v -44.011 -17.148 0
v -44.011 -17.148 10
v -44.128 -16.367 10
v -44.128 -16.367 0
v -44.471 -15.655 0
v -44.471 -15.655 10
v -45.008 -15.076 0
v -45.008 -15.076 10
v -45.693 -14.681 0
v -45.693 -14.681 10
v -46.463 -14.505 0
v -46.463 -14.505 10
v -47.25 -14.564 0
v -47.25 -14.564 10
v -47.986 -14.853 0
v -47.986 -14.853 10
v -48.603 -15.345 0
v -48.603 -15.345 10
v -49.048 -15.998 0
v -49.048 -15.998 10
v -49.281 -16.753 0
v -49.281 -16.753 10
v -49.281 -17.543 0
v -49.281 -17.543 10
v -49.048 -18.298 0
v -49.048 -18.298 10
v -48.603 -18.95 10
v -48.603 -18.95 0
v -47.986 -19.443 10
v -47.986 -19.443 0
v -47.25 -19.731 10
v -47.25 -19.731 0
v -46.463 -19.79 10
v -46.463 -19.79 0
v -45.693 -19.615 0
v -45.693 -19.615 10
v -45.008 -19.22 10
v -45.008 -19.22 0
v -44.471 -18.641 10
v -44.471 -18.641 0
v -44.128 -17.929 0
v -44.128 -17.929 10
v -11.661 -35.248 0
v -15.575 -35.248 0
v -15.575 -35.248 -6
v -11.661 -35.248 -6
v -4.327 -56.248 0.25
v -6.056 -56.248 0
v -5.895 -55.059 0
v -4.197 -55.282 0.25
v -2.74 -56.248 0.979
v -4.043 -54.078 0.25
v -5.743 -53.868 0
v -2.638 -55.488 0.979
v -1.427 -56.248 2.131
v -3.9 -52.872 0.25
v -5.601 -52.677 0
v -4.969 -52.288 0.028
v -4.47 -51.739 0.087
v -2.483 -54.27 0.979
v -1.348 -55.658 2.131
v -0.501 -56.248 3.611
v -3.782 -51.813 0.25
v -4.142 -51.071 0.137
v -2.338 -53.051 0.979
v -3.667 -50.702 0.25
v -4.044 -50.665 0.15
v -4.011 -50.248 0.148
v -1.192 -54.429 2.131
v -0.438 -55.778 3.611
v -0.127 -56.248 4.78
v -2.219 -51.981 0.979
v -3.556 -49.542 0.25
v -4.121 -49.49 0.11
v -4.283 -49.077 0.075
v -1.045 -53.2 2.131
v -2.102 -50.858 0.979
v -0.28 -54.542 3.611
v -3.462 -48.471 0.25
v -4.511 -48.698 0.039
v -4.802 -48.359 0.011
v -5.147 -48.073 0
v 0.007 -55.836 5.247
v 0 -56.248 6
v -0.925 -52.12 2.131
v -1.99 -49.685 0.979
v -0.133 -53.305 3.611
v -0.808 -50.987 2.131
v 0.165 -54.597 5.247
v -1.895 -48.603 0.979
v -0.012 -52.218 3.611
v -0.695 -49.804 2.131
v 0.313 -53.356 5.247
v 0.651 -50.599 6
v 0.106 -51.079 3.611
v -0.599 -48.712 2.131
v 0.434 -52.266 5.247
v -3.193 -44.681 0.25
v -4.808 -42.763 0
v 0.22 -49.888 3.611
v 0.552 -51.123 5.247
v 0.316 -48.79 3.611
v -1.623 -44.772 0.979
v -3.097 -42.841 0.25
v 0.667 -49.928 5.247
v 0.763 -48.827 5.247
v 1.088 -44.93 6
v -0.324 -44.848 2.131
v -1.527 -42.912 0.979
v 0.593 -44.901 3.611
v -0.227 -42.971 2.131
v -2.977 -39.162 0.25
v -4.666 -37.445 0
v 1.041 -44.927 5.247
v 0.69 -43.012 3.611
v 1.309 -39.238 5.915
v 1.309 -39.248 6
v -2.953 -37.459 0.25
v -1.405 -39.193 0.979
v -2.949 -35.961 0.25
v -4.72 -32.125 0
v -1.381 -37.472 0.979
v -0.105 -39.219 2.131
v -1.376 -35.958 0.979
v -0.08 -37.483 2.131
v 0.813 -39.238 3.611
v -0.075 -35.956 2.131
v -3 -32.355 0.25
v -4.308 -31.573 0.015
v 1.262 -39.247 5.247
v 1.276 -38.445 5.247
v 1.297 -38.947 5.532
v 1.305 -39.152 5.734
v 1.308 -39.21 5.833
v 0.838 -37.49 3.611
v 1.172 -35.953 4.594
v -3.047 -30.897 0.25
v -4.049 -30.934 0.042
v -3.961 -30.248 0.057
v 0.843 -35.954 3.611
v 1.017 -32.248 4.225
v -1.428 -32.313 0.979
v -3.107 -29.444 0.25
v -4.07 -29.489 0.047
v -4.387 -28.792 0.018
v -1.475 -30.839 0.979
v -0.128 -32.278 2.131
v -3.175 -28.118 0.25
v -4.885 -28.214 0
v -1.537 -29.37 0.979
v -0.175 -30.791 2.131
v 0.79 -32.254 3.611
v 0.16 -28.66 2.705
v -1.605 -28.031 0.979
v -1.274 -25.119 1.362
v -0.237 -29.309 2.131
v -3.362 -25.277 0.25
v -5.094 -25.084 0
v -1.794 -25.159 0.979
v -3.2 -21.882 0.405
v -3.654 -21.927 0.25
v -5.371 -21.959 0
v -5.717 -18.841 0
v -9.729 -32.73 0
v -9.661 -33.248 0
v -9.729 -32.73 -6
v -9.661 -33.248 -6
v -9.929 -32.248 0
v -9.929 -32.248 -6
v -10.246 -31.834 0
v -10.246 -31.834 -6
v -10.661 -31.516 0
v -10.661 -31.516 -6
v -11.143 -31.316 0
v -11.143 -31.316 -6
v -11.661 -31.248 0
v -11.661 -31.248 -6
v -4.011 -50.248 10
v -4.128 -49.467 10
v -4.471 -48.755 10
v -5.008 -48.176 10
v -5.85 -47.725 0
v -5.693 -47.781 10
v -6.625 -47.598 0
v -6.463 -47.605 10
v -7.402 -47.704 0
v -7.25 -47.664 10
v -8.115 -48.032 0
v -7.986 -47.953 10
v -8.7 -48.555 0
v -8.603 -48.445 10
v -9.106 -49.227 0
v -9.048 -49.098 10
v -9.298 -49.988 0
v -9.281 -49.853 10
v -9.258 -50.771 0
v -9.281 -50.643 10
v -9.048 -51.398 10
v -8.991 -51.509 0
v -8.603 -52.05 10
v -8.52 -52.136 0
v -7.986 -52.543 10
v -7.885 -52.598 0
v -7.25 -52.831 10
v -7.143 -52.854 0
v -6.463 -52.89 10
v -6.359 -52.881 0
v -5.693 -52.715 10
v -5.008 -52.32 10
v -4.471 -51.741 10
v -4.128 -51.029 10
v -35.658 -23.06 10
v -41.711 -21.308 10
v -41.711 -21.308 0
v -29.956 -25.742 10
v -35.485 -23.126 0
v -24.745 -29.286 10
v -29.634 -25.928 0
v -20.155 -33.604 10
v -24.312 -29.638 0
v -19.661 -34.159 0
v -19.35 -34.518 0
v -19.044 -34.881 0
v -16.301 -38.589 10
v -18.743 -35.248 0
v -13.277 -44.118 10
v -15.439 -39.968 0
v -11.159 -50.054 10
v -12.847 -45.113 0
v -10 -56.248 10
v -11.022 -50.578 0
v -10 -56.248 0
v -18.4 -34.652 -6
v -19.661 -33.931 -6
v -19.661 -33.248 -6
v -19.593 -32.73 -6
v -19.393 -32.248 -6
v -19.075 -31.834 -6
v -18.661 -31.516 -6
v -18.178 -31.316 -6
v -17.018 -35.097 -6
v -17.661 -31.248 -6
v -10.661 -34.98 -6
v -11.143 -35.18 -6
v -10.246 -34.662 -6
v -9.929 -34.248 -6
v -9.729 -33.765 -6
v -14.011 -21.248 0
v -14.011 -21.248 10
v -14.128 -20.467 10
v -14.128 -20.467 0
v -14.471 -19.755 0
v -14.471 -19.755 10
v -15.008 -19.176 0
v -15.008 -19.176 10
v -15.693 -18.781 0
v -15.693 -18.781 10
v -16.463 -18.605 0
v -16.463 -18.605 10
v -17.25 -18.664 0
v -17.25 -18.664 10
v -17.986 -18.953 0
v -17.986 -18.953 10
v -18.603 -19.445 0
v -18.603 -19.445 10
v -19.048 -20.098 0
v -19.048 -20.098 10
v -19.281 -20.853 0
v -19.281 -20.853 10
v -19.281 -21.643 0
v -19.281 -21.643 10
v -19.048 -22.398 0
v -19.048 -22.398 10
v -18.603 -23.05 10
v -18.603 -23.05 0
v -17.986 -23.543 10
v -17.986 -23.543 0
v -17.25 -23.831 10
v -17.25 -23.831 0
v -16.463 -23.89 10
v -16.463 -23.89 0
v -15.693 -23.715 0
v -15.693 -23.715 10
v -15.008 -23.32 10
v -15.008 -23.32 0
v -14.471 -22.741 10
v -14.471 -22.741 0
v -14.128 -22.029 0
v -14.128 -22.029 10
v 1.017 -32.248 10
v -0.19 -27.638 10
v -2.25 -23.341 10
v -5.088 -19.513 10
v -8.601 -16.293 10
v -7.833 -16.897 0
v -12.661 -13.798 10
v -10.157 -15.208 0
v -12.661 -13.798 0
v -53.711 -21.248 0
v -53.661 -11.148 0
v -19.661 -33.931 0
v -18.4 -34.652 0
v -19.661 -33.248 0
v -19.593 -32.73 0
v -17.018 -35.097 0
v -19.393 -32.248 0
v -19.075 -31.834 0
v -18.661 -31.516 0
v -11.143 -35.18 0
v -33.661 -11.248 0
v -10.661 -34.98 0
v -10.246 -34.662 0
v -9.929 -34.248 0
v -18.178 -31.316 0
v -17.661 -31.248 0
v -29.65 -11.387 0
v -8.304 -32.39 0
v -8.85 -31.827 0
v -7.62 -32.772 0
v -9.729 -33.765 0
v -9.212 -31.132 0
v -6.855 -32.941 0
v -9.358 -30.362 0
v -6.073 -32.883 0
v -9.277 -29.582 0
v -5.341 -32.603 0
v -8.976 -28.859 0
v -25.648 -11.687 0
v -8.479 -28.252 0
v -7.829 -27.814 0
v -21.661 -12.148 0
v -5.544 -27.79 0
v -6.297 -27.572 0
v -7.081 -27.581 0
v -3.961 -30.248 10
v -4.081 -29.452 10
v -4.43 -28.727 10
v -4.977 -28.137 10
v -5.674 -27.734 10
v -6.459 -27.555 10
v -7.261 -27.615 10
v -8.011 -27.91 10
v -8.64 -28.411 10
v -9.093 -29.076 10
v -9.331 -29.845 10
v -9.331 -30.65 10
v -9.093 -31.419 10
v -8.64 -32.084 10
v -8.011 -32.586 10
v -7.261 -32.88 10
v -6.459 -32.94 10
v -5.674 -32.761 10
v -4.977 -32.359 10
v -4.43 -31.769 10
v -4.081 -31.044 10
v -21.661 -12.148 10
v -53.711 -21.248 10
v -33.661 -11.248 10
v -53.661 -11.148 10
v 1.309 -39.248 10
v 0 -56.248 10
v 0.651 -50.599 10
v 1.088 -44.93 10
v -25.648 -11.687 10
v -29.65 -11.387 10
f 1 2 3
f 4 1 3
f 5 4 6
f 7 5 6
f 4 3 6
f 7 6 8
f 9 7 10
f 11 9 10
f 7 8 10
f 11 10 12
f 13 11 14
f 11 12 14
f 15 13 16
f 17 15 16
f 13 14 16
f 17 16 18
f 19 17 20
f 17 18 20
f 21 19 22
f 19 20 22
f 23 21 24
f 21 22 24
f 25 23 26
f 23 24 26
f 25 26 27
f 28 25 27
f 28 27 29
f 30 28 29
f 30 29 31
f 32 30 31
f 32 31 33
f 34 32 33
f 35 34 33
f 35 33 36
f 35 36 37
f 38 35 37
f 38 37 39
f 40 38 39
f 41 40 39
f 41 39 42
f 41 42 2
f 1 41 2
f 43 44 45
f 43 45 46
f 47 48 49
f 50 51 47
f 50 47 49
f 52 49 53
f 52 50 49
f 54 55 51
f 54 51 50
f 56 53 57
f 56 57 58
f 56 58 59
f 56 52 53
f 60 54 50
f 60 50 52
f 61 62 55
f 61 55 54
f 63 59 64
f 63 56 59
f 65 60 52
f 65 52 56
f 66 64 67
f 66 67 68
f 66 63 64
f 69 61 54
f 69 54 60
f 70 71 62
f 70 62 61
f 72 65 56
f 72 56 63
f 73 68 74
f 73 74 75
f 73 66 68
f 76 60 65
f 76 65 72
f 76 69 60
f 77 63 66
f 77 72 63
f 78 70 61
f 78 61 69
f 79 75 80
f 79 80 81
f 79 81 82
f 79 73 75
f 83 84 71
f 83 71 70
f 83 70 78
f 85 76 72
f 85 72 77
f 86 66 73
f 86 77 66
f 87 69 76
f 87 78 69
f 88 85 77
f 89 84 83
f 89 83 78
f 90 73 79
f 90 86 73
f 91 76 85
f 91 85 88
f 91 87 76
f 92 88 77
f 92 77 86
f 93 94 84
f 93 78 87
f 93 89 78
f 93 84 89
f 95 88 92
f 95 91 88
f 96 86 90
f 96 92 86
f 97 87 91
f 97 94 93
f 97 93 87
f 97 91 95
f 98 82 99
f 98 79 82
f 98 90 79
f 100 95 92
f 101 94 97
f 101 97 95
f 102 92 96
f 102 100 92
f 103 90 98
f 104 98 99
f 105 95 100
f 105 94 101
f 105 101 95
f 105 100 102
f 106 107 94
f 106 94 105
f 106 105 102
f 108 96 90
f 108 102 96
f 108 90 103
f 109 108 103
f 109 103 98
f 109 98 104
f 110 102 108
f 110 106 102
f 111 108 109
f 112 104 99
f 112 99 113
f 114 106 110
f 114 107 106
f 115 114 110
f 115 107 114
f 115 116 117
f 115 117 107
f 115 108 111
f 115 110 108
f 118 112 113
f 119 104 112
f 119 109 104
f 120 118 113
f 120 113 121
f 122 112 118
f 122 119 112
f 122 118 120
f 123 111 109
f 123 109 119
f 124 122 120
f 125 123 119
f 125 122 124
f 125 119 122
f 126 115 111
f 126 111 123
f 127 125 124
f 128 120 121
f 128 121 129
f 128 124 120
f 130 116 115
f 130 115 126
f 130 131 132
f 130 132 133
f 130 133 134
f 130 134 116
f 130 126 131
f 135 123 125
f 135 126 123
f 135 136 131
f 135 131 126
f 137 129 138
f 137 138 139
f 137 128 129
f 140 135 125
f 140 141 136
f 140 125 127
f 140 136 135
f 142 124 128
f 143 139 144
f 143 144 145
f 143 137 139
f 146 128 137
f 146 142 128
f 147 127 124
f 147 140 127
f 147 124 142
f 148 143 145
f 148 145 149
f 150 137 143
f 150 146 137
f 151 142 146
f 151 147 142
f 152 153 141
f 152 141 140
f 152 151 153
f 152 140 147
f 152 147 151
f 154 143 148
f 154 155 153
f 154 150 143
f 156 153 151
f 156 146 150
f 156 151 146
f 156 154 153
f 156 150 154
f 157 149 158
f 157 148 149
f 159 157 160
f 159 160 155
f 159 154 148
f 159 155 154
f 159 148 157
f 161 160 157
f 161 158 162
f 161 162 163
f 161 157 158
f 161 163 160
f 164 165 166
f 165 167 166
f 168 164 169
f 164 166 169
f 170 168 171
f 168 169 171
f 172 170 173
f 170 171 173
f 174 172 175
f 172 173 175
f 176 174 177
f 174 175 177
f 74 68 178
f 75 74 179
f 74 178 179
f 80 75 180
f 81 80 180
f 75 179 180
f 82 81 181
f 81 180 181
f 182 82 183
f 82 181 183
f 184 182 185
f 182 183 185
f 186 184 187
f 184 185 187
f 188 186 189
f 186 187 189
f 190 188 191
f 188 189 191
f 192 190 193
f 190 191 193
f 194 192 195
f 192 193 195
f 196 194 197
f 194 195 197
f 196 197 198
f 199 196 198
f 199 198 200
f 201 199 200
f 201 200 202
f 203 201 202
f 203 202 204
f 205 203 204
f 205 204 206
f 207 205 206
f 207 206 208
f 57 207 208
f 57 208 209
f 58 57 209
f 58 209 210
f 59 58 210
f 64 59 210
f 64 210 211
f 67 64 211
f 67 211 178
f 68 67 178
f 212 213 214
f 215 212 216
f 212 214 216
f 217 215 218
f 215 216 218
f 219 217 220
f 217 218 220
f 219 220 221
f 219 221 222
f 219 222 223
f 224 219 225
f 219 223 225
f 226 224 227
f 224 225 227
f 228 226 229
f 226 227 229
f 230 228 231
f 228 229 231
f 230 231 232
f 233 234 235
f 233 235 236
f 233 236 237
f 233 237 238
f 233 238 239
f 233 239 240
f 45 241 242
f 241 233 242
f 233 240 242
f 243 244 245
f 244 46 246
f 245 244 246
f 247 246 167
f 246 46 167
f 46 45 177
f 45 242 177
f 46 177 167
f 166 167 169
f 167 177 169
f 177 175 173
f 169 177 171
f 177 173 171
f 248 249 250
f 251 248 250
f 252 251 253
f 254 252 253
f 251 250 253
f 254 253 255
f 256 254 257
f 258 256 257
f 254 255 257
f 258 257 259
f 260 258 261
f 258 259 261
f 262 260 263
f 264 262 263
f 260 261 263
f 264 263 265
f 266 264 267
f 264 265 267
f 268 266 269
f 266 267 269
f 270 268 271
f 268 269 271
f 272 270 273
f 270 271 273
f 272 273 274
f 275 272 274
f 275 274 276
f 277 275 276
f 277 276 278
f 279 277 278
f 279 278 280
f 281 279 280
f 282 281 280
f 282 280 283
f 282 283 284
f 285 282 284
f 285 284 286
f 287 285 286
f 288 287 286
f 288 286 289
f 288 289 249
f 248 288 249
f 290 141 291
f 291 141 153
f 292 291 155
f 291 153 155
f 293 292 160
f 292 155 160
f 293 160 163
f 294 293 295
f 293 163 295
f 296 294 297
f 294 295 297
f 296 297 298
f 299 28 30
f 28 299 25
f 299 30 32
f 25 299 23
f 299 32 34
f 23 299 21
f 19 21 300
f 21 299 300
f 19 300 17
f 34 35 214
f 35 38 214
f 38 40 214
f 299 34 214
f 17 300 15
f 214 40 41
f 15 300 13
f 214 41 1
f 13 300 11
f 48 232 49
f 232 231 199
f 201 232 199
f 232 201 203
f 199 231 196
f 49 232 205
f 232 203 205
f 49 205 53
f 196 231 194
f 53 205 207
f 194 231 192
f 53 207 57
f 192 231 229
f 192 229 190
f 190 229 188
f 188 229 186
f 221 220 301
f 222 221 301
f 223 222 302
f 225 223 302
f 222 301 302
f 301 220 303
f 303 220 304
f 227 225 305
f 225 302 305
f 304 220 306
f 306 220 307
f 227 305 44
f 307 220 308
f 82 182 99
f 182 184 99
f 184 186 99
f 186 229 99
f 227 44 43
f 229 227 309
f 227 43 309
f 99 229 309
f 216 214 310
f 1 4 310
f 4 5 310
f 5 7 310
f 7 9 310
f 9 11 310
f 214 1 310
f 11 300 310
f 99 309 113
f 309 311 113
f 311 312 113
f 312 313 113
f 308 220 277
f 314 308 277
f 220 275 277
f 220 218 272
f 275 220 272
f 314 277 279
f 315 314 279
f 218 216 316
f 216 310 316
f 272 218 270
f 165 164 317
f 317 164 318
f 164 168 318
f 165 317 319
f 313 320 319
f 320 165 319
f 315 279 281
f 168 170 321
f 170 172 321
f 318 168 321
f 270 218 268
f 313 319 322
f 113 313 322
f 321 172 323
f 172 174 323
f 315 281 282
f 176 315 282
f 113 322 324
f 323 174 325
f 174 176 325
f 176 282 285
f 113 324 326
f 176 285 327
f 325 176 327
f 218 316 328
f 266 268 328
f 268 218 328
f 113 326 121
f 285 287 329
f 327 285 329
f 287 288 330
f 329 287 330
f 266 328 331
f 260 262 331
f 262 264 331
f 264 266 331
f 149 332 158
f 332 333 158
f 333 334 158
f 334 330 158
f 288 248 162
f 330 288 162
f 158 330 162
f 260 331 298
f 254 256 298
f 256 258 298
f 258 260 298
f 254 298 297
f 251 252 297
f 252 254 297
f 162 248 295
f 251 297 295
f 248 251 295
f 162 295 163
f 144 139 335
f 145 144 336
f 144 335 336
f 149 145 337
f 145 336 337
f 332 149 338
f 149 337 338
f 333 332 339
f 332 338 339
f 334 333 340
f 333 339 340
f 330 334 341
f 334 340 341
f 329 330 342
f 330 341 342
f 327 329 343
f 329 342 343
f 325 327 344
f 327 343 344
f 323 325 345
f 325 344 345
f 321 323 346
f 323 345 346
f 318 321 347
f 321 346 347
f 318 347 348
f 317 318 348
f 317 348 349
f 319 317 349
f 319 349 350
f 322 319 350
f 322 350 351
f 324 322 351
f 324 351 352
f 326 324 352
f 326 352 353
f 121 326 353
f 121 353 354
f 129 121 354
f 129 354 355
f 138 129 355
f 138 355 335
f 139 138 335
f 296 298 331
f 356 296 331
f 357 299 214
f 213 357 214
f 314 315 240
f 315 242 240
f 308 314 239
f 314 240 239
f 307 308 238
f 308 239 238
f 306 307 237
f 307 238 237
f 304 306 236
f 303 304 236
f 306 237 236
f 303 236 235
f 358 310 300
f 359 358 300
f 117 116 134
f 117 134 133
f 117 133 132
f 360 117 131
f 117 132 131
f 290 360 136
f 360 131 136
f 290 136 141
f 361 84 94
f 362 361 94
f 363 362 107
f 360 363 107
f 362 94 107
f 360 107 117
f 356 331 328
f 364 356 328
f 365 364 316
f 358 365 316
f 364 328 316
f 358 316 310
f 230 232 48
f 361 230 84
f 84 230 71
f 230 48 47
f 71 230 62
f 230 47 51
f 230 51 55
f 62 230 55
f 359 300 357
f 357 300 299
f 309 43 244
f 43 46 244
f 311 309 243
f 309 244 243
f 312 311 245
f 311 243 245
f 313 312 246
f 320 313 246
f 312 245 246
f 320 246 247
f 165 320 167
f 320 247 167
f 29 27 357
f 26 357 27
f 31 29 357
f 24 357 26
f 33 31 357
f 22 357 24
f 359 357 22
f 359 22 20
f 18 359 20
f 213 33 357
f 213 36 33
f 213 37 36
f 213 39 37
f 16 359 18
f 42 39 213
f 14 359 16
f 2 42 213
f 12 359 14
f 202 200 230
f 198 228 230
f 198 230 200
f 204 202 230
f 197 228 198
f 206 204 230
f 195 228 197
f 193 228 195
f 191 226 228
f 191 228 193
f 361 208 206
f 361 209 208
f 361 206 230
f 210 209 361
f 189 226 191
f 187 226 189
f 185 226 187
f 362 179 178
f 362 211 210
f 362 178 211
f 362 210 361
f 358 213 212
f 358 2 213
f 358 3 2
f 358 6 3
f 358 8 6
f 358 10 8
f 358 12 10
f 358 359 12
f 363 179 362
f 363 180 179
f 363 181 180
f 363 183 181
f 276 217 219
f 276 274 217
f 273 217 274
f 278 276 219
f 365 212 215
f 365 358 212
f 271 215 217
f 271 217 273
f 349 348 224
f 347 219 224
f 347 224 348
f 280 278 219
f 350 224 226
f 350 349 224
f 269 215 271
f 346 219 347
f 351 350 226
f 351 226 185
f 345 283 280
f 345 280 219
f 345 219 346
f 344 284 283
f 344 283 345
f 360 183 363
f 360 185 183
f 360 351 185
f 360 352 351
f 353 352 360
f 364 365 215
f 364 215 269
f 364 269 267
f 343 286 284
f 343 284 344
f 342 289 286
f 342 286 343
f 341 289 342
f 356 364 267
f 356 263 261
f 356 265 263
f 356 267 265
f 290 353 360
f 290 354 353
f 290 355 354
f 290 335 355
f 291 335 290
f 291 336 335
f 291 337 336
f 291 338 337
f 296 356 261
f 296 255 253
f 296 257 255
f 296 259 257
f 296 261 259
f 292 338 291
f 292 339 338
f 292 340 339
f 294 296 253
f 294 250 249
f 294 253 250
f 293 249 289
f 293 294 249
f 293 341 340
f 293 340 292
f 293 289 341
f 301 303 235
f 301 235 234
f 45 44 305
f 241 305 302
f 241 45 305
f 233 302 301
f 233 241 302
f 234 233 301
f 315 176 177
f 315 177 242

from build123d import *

# Parameters (mm, degrees)
F1_DEPTH    = 10
F2_R        = 2.65
F2_R_2      = 2.7
F3_DEPTH    = 10.001
F4_T2_ANGLE = 34.0182957269
F6_DEPTH    = 6
F7_R        = 1.99999
F8_T1_DEPTH = 13.9199888123


# Not quite as in the source:
# - a fillet or chamfer that OpenCascade refuses, or shapes differently, is made with other operations: its cross-section is extruded or revolved along the edge and cut away or added
# - a fillet or chamfer is up to 0.001 mm smaller than in the source, because OpenCascade refuses the exact size


with BuildPart() as f1:
    # F0 (on Top) → F1 (new body)
    with BuildSketch(Plane.XY):
        with BuildLine():
            Line((-33.6606874732, -11.2477834763), (-53.6606874732, -11.1477834763))
            Line((-53.6606874732, -11.1477834763), (-53.7111874732, -21.2477834763))
            Line((-53.7111874732, -21.2477834763), (-41.7113374704, -21.3077827264))
            ThreePointArc((-41.7113374704, -21.3077827264), (-20.1551088941, -33.6039887965), (-10, -56.2477834763))
            Line((-10, -56.2477834763), (0, -56.2477834763))
            ThreePointArc((0, -56.2477834763), (0.8963967025, -47.7664020072), (1.3093095262, -39.2477834763))
            Line((1.3093095262, -39.2477834763), (1.0172378853, -32.2477834763))
            ThreePointArc((1.0172378853, -32.2477834763), (-3.5776423647, -21.3591536143), (-12.6606874732, -13.7978391557))
            Line((-12.6606874732, -13.7978391557), (-21.6606874732, -12.1477834763))
            ThreePointArc((-21.6606874732, -12.1477834763), (-27.6471372828, -11.5171142711), (-33.6606874732, -11.2477834763))
        make_face()
    extrude(amount=F1_DEPTH)

    # F2 (on face) → F3 (cut, through all)
    with BuildSketch(Plane.XY.offset(10)):
        with Locations((-46.6606874732, -17.1477834763)):
            Circle(F2_R)
        with Locations((-16.6606874732, -21.2477834763)):
            Circle(F2_R)
        with Locations((-6.6606874732, -50.2477834763)):
            Circle(F2_R)
        with Locations((-6.6606874732, -30.2477834763)):
            Circle(F2_R_2)
    extrude(amount=-F3_DEPTH, mode=Mode.SUBTRACT)

    # F4: fillet of radius 6 on 1 edges, made by hand

    # F4_s1 → F4_t2 (revolve, cut)
    with BuildSketch(Plane(origin=(-32.1356329931, -81.9445924317, 0), x_dir=(0, 0, 1), z_dir=(-0.3650924394, -0.9309712727, 0))):
        with BuildLine():
            ThreePointArc((0, -18.8349622687), (1.7573593129, -23.0776029558), (6, -24.8349622687))
            Line((6, -24.8349622687), (6, -24.9549622687))
            Line((6, -24.9549622687), (-0.12, -24.9549622687))
            Line((-0.12, -24.9549622687), (-0.12, -18.8349622687))
            Line((-0.12, -18.8349622687), (0, -18.8349622687))
        make_face()
    revolve(axis=Axis((-148.6606874732, -36.2477834763, 0), (0, 0, 1)), revolution_arc=F4_T2_ANGLE, mode=Mode.SUBTRACT)

    # F5 (on face) → F6 (join)
    with BuildSketch(Plane.XY):
        with BuildLine():
            ThreePointArc((-19.6606874732, -34.1590258202), (-19.1967513982, -34.6993177477), (-18.7425076385, -35.2477834763))
            Line((-18.7425076385, -35.2477834763), (-9.6606874732, -35.2477834763))
            Line((-9.6606874732, -35.2477834763), (-9.6606874732, -31.2477834763))
            Line((-9.6606874732, -31.2477834763), (-19.6606874732, -31.2477834763))
            Line((-19.6606874732, -31.2477834763), (-19.6606874732, -34.1590258202))
        make_face()
    extrude(amount=-F6_DEPTH)

    # F7 (radius 2 in the source; OpenCascade refuses exactly that, so slightly less here)
    f7_edges = [f1.edges().sort_by_distance(p)[0] for p in [
        (-19.660687, -31.247783, -3),
        (-9.660687, -31.247783, -3),
        (-9.660687, -35.247783, -3),
    ]]
    fillet(f7_edges, radius=F7_R)

    # F8: fillet of radius 7 on 1 edges, made by hand

    # F8_s2 → F8_t1 (cut)
    with BuildSketch(Plane.XY.offset(-13.9199888123)):
        with BuildLine():
            ThreePointArc((-15.5745121135, -35.2477834763), (-18.3484354275, -34.6747072699), (-20.6681674701, -33.0493118901))
            ThreePointArc((-20.6681674701, -33.0493118901), (-19.6852521083, -34.1309546714), (-18.7425076385, -35.2477834763))
            Line((-18.7425076385, -35.2477834763), (-15.5745121135, -35.2477834763))
        make_face()
    extrude(amount=F8_T1_DEPTH, mode=Mode.SUBTRACT)


solid = f1.part
